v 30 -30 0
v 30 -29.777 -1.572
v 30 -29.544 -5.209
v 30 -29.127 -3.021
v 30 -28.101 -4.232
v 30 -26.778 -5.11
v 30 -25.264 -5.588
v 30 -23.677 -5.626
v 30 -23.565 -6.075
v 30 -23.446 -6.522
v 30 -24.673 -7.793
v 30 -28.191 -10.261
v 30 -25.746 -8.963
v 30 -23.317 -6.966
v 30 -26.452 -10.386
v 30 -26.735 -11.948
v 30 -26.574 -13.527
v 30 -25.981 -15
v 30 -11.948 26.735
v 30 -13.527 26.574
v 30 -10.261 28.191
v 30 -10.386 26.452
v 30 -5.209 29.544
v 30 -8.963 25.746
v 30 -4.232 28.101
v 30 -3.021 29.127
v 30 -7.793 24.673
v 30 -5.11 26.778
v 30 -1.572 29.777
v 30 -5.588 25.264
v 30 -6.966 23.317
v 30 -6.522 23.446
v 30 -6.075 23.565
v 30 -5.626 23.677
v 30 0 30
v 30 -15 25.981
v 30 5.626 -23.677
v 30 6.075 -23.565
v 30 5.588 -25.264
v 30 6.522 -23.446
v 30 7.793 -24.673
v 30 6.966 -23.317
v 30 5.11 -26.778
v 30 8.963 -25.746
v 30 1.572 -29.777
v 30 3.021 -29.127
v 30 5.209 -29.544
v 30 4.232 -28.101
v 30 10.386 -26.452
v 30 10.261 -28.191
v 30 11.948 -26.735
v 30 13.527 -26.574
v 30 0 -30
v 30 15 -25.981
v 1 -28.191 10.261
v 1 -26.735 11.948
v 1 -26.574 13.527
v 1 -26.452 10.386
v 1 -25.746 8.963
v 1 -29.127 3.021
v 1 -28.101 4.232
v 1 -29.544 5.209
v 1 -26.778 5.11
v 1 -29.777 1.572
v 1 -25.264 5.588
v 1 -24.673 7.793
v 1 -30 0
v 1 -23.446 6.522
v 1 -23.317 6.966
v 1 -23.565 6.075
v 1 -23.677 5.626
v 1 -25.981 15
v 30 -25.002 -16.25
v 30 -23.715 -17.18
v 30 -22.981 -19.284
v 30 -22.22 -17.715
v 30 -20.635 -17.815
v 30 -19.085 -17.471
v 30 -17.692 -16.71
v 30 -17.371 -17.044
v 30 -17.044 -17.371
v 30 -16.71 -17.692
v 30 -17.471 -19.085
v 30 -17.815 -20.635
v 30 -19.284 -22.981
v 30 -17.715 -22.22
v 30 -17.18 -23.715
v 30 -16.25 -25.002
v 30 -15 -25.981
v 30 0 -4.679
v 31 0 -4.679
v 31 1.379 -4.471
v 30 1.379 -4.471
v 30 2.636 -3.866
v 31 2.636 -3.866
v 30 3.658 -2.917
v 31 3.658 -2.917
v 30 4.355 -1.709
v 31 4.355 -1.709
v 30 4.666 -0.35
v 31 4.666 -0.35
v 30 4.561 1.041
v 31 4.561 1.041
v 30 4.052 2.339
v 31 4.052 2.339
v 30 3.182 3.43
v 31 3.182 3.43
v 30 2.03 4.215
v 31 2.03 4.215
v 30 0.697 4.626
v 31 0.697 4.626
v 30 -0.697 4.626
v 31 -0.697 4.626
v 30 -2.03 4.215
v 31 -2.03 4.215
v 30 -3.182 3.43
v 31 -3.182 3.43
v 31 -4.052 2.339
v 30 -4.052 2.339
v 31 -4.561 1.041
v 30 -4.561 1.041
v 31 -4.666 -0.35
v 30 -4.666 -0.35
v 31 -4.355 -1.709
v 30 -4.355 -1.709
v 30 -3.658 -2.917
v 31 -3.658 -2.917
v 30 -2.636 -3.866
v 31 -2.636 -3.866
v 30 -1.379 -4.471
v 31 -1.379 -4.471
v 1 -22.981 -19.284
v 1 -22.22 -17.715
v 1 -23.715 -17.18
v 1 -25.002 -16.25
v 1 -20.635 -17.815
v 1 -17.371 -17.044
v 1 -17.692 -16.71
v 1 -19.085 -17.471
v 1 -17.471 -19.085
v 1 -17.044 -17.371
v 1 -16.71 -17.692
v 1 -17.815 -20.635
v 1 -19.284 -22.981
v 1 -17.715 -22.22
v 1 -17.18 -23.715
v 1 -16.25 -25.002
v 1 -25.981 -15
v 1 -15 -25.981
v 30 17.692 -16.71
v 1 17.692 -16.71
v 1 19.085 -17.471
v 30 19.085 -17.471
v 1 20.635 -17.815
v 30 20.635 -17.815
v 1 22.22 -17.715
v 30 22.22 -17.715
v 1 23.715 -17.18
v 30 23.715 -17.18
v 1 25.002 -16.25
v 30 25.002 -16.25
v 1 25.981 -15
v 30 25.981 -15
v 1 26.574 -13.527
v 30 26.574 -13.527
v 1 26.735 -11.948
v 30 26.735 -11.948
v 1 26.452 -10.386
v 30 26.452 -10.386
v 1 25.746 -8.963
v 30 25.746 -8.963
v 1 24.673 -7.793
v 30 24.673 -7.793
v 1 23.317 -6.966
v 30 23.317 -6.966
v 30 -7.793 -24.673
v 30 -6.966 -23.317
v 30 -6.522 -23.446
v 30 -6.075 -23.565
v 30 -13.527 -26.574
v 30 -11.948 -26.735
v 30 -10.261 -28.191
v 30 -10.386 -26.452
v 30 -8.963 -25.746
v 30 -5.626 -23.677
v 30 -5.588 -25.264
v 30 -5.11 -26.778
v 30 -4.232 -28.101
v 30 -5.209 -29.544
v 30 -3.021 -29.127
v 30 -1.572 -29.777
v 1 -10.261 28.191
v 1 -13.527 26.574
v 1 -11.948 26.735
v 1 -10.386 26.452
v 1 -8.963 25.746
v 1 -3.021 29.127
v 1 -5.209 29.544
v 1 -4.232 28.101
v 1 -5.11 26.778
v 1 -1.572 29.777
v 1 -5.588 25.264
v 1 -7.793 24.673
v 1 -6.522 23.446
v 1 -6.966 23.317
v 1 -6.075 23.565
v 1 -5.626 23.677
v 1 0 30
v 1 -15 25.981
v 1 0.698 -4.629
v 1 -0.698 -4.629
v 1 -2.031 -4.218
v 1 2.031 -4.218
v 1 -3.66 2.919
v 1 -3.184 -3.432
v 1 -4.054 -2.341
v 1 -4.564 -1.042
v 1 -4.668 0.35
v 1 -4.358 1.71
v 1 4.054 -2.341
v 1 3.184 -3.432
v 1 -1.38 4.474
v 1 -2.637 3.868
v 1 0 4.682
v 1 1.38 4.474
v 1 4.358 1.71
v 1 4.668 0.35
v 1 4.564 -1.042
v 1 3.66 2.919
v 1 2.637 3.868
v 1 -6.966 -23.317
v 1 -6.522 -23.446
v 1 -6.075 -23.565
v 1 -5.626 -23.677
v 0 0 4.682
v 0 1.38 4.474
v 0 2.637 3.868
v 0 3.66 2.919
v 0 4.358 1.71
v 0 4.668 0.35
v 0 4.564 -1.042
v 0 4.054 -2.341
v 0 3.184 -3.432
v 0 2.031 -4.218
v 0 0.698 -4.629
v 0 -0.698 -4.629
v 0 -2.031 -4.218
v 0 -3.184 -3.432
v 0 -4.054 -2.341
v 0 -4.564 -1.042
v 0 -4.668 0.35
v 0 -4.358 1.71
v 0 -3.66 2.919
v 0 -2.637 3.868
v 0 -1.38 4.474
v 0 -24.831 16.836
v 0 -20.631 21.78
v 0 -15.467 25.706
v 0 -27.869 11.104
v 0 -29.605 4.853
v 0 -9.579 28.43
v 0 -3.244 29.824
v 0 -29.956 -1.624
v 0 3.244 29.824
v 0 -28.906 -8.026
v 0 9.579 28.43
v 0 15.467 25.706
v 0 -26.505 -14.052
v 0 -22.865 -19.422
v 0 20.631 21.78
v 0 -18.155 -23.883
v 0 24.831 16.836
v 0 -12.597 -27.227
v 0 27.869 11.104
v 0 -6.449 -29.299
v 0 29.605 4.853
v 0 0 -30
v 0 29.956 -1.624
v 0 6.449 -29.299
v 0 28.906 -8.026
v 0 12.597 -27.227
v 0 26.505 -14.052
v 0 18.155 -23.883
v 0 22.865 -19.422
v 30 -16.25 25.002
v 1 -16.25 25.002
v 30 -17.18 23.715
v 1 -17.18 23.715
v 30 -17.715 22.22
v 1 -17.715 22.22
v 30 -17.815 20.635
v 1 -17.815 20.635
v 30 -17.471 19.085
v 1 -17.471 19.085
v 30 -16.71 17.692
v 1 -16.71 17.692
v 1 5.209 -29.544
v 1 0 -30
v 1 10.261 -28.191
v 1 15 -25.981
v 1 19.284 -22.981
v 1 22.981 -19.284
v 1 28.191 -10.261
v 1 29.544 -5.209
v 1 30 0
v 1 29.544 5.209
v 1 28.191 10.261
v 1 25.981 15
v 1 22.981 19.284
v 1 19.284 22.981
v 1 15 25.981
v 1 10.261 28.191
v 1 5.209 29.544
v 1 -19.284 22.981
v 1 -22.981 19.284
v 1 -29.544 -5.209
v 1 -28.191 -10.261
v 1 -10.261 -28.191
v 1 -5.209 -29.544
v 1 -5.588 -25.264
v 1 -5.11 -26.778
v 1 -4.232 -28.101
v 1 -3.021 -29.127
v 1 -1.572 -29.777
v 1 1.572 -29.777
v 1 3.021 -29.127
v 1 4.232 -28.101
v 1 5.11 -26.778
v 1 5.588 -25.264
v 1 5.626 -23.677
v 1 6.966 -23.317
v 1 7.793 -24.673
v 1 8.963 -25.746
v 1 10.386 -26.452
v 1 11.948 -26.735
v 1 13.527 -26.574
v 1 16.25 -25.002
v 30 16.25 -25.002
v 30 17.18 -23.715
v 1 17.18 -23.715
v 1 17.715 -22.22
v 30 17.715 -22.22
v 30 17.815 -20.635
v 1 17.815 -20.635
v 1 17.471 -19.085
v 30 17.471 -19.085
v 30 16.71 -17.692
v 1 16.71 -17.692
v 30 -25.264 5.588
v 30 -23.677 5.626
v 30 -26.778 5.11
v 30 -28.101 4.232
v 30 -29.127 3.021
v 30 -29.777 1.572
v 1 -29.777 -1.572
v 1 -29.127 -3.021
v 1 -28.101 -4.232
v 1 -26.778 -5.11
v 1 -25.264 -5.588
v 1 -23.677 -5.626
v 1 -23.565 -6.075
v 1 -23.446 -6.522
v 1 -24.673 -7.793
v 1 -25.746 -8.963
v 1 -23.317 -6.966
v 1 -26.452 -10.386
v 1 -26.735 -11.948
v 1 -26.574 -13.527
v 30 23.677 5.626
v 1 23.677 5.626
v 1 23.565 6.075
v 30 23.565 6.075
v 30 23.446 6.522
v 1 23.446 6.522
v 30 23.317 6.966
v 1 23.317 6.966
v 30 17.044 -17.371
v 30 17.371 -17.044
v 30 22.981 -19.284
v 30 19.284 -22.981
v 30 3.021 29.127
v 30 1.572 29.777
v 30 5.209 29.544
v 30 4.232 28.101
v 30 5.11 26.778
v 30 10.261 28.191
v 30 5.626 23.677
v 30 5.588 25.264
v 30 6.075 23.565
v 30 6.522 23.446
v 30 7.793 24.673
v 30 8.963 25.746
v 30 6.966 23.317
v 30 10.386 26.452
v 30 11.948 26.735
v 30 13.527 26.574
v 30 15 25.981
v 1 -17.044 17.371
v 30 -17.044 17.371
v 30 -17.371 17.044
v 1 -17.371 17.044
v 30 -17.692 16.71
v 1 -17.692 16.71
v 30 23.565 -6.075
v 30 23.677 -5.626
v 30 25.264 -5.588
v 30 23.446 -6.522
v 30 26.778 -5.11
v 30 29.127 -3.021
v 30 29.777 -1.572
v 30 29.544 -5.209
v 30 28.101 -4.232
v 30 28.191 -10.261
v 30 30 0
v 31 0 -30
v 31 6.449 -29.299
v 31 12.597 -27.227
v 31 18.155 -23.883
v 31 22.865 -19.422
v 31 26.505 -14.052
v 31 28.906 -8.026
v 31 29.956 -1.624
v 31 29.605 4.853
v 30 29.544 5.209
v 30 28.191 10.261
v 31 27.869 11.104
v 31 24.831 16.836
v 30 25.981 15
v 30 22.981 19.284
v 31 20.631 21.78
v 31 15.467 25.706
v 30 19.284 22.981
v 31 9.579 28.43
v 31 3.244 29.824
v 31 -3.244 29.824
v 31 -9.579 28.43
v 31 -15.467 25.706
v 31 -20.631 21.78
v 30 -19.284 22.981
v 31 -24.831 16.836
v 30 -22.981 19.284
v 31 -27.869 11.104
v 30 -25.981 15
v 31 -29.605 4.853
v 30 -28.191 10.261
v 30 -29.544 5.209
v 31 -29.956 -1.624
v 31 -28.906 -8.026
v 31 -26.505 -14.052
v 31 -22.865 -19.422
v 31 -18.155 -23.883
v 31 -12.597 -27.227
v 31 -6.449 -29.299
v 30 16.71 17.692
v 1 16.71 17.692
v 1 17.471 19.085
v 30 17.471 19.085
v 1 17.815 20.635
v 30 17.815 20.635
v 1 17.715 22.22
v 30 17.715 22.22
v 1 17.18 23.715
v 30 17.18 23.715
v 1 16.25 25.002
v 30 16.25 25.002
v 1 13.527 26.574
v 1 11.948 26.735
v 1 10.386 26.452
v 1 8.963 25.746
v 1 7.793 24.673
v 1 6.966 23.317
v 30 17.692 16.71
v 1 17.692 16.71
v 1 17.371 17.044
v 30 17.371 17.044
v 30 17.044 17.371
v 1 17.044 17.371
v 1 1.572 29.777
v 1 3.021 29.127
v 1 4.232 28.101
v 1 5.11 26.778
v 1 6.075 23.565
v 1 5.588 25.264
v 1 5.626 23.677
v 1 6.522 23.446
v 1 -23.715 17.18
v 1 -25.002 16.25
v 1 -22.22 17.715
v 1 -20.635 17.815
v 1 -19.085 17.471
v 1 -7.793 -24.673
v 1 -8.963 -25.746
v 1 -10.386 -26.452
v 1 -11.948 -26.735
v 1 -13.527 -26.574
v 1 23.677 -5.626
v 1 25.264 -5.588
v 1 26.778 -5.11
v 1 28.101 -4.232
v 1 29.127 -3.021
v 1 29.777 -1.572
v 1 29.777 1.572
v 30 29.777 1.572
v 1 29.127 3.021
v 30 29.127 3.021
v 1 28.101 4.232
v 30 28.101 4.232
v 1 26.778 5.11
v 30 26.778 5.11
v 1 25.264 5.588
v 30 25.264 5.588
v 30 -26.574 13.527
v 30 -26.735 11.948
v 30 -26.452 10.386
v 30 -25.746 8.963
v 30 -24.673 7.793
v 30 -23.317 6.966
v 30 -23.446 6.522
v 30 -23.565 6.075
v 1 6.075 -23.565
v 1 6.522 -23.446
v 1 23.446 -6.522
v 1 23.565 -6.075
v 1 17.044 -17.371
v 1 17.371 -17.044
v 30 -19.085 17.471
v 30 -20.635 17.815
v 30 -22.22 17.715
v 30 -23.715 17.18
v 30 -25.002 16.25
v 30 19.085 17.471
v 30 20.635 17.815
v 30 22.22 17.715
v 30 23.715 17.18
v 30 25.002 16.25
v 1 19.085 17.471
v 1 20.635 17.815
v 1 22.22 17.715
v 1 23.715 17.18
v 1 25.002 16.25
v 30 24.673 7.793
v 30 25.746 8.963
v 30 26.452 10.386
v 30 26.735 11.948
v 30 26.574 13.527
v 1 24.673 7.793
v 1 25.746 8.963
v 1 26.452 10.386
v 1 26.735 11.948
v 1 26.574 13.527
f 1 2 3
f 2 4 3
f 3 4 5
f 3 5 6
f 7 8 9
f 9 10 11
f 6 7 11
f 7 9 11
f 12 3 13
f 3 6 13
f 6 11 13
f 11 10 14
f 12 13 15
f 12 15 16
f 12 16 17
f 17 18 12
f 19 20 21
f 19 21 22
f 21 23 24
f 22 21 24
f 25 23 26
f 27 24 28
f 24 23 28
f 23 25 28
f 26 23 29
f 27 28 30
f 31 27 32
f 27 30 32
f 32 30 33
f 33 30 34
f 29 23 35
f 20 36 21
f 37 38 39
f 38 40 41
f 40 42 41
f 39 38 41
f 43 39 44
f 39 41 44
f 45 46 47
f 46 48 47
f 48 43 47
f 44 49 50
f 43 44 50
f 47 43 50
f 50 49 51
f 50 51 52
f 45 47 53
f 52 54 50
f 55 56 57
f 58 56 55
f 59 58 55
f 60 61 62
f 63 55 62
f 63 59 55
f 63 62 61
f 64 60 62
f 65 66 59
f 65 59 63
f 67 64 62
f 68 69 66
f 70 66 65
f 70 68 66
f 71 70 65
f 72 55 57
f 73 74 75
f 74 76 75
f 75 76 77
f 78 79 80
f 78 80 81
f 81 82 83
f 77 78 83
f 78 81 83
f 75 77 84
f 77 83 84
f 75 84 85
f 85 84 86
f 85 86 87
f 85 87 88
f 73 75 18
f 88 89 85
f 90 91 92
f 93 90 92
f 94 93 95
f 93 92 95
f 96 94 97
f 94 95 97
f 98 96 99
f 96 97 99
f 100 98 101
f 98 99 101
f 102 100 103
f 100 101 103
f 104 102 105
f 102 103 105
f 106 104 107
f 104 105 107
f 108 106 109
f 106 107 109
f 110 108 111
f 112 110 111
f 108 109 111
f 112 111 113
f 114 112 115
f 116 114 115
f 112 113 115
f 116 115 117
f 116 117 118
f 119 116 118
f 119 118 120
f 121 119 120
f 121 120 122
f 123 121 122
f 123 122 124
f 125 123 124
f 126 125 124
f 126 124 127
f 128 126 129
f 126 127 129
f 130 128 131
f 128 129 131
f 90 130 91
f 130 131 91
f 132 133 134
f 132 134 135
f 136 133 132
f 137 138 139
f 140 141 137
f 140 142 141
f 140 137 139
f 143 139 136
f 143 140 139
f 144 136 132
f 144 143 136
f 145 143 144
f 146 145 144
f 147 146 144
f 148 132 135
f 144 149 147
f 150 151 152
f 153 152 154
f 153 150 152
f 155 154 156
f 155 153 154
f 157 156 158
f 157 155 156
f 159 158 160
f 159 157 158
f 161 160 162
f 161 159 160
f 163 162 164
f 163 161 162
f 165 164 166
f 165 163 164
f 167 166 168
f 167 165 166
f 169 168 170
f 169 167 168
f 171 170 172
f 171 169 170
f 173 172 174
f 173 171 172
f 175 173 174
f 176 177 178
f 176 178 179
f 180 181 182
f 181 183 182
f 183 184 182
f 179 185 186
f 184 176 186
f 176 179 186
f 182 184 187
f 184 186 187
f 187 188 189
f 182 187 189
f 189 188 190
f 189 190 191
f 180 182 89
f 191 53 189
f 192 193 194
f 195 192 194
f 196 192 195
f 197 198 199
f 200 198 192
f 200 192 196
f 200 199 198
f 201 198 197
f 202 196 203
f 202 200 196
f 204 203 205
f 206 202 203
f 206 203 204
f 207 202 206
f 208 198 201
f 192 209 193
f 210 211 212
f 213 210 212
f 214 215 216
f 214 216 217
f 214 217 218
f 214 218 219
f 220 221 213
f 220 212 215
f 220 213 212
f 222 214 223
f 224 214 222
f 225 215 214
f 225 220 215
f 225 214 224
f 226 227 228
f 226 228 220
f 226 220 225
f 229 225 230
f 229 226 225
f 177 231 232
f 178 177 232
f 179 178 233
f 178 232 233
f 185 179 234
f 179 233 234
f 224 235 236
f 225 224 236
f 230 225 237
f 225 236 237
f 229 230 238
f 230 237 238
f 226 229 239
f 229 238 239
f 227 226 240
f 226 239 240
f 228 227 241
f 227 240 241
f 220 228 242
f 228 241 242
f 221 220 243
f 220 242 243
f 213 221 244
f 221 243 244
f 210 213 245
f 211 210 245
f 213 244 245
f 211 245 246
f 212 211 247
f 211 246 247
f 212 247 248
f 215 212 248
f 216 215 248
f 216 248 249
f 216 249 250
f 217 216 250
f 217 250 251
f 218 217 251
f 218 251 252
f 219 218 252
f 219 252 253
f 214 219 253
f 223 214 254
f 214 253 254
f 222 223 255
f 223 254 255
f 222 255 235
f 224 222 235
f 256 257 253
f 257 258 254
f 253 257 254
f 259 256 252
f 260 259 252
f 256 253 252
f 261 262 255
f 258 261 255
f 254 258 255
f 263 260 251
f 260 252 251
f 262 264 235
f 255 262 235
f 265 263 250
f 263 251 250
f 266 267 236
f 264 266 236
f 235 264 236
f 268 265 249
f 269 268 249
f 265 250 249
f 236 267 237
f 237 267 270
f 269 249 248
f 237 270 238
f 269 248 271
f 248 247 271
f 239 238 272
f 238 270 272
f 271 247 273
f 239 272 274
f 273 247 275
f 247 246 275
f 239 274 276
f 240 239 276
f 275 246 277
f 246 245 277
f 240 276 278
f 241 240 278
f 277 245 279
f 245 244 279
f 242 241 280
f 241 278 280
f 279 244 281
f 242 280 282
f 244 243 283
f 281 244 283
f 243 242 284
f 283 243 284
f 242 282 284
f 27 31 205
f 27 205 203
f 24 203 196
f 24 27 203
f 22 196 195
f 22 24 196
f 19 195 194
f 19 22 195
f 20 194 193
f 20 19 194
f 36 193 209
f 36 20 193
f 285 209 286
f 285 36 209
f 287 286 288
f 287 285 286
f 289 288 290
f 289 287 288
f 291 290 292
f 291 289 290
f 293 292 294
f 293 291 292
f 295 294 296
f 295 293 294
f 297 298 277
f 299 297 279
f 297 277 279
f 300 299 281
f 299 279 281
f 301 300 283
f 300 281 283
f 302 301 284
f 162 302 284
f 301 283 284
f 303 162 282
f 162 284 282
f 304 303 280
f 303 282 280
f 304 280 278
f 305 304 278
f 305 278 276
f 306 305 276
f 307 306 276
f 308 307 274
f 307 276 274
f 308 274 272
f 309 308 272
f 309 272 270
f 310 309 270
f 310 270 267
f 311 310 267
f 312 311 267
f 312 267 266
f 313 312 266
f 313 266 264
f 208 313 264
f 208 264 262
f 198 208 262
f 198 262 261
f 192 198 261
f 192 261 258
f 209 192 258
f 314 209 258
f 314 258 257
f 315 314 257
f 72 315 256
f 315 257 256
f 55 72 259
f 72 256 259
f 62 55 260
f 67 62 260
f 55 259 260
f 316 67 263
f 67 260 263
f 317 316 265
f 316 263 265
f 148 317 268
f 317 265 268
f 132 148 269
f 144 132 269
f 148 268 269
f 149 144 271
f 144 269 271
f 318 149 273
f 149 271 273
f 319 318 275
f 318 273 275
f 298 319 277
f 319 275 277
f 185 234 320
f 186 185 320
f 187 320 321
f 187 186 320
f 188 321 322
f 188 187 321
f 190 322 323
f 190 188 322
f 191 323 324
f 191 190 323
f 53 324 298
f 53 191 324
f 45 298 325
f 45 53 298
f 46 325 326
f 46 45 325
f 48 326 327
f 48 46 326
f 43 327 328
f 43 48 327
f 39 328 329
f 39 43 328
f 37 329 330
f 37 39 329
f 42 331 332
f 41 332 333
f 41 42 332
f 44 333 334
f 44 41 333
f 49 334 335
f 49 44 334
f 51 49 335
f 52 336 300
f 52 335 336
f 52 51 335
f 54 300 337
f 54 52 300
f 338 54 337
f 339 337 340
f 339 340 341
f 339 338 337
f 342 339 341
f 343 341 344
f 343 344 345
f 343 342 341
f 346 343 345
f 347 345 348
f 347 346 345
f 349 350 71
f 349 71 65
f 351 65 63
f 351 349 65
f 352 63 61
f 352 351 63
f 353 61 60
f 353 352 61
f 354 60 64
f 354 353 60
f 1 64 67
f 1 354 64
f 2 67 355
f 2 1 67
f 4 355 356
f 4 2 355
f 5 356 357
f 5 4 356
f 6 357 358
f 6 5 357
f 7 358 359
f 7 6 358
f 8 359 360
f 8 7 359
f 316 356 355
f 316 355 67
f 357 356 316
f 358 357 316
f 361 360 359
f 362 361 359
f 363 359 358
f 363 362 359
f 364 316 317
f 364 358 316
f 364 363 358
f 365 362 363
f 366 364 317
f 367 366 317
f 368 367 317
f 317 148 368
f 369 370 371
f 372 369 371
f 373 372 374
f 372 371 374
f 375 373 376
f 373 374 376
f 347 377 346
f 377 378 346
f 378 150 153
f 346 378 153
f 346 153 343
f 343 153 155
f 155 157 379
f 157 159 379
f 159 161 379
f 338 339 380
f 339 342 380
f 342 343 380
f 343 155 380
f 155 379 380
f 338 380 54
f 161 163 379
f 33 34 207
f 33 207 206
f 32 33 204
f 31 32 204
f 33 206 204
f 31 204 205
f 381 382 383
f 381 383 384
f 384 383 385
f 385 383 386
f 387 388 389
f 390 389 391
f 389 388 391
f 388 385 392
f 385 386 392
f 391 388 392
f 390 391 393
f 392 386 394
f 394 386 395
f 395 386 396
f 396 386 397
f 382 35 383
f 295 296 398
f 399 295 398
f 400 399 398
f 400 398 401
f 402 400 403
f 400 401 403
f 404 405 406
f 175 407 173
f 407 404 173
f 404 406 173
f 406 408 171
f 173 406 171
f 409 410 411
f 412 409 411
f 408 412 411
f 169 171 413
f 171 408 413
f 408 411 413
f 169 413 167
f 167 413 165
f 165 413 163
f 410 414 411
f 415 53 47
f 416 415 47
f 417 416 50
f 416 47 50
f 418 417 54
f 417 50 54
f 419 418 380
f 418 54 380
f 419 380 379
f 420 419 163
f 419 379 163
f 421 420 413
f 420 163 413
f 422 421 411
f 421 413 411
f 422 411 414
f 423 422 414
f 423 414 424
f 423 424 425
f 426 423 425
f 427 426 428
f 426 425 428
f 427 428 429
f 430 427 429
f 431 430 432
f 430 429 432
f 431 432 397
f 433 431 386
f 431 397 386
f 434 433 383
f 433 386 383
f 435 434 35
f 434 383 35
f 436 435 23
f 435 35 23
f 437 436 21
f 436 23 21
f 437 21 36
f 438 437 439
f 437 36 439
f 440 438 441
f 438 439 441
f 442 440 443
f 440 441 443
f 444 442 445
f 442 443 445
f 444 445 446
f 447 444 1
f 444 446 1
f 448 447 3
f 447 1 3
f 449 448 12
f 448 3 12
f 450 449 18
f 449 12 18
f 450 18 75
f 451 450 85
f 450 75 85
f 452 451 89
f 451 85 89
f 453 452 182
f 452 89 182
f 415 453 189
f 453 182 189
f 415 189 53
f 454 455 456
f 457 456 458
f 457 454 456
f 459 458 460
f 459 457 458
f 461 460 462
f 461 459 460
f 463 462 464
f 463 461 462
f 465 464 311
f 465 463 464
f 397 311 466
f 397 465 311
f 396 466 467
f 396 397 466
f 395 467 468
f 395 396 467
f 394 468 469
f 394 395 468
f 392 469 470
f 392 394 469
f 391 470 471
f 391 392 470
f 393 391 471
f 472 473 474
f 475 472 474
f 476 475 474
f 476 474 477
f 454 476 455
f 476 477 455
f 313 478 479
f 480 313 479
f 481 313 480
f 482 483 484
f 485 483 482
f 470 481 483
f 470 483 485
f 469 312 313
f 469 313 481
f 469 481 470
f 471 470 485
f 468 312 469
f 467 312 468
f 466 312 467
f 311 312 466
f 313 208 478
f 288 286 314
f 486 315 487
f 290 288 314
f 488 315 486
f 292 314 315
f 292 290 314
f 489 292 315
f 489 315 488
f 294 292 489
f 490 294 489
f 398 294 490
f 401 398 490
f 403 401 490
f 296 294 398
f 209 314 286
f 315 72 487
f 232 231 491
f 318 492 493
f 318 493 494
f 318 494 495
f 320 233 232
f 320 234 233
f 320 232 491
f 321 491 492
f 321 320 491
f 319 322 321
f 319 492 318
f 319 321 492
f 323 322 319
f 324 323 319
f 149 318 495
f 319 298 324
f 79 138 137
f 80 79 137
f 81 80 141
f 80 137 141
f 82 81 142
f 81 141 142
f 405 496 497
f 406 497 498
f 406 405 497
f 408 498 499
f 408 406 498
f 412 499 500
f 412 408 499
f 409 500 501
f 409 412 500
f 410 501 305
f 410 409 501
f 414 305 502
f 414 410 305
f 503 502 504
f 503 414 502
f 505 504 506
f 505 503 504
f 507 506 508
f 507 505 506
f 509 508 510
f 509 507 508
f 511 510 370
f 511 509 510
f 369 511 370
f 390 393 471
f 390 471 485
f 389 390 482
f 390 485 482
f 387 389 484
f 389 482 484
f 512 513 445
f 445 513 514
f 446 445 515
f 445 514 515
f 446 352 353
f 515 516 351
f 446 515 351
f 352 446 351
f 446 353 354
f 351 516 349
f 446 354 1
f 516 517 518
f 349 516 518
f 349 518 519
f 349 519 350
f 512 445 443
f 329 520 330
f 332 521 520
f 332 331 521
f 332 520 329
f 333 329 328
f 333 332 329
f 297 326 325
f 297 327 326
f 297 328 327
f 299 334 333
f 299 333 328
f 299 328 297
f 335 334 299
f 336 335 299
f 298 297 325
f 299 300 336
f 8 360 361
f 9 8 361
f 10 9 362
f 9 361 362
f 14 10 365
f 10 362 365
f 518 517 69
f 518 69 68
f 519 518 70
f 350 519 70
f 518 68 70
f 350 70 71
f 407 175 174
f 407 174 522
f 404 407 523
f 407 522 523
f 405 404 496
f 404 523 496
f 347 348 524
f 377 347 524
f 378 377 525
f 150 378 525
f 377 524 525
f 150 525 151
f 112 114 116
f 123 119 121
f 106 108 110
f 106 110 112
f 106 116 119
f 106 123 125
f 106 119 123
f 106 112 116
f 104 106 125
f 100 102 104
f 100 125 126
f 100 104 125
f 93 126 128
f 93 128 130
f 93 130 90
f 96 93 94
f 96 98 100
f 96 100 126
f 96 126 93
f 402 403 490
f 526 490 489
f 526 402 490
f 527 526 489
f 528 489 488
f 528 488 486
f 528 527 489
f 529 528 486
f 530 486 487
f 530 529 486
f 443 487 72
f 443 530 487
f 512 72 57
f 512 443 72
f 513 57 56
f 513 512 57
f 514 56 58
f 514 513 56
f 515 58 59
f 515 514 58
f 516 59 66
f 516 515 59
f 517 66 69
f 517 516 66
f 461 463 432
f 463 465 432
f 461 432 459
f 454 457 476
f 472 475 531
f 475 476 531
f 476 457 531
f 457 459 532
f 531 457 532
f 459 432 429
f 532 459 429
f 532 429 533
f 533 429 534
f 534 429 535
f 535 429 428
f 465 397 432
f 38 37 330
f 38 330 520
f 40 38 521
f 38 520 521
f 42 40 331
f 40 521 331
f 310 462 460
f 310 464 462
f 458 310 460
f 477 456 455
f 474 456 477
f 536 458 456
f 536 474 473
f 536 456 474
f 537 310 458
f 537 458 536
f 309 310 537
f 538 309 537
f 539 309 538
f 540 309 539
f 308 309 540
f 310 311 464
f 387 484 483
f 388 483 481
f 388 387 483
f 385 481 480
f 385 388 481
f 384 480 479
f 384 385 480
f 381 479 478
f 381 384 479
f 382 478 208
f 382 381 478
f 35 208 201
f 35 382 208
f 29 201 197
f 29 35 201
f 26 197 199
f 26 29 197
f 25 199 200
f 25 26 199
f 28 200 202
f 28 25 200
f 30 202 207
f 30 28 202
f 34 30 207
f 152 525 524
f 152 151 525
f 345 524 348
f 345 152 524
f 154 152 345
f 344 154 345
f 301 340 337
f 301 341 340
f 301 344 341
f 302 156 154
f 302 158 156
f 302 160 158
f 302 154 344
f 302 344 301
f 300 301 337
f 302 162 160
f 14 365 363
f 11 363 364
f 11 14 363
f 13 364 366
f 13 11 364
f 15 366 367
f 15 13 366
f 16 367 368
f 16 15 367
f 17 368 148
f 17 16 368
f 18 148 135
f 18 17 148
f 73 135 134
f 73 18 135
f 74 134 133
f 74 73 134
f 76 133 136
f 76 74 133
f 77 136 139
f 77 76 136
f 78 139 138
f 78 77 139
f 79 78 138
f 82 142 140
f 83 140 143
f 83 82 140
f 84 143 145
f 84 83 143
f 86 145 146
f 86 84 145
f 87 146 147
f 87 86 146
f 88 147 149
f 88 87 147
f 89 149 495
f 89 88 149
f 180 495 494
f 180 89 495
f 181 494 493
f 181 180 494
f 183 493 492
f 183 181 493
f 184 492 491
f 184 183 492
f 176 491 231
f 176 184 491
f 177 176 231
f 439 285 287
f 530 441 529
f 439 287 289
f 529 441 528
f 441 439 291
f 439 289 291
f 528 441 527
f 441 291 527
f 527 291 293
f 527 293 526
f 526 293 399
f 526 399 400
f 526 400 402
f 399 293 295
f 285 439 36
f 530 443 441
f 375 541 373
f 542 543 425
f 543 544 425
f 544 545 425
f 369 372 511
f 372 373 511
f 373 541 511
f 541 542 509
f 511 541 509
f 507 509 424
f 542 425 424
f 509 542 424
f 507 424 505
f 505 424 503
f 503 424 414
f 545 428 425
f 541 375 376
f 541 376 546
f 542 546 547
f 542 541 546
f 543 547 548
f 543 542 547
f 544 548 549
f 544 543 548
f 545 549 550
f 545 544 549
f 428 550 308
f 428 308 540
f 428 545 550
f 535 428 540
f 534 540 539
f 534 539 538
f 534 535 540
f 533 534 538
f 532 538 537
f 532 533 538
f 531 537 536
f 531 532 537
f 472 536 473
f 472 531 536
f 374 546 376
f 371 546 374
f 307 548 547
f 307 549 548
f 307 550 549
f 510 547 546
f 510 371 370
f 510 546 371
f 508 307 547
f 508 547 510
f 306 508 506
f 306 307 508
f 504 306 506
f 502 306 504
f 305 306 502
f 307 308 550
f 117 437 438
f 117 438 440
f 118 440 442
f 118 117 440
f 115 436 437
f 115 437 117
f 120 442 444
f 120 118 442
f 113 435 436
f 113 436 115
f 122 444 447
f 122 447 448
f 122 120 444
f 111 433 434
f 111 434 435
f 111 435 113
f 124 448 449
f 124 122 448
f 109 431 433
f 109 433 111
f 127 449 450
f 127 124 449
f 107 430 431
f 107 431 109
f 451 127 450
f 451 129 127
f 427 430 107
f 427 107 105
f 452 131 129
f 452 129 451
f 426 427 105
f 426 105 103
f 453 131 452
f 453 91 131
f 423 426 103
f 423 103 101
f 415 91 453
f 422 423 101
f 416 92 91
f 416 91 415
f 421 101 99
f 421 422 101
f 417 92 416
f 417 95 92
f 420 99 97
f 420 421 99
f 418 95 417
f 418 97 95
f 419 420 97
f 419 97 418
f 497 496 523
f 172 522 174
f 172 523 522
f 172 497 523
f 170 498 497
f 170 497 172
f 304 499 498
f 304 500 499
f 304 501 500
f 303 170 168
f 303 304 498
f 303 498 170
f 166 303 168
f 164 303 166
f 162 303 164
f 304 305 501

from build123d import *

# Parameters (mm, degrees)
SKETCH1_R           = 30
BOSS_EXTRUDE1_DEPTH = 1
SKETCH2_R           = 24.335851471
BOSS_EXTRUDE2_DEPTH = 29
SKETCH3_R           = 5.664148529
BOSS_EXTRUDE3_DEPTH = 29
SKETCH4_R           = 30
BOSS_EXTRUDE4_DEPTH = 1
SKETCH5_R           = 4.681501742
CUT_EXTRUDE1_DEPTH  = 1
SKETCH6_R           = 4.678679428
CUT_EXTRUDE2_DEPTH  = 1


with BuildPart() as part:
    # Sketch1 → Boss-Extrude1 (new body)
    with BuildSketch(Plane(origin=(0, 0, 0), x_dir=(0, 0, -1), z_dir=(1, 0, 0))):
        Circle(SKETCH1_R)
    extrude(amount=BOSS_EXTRUDE1_DEPTH)

    # Sketch2 → Boss-Extrude2 (add)
    with BuildSketch(Plane(origin=(1, 0, 0), x_dir=(0, 0, -1), z_dir=(1, 0, 0))):
        Circle(SKETCH2_R)
    extrude(amount=BOSS_EXTRUDE2_DEPTH)

    # Sketch3 → Boss-Extrude3 (add)
    with BuildSketch(Plane(origin=(30, 0, 0), x_dir=(0, 0, -1), z_dir=(1, 0, 0))):
        with Locations((0, 24.335851471)):
            Circle(SKETCH3_R)
        with Locations((12.167925735, 21.075465597)):
            Circle(SKETCH3_R)
        with Locations((21.075465597, 12.167925735)):
            Circle(SKETCH3_R)
        with Locations((24.335851471, 0)):
            Circle(SKETCH3_R)
        with Locations((21.075465597, -12.167925735)):
            Circle(SKETCH3_R)
        with Locations((12.167925735, -21.075465597)):
            Circle(SKETCH3_R)
        with Locations((0, -24.335851471)):
            Circle(SKETCH3_R)
        with Locations((-12.167925735, -21.075465597)):
            Circle(SKETCH3_R)
        with Locations((-21.075465597, -12.167925735)):
            Circle(SKETCH3_R)
        with Locations((-24.335851471, 0)):
            Circle(SKETCH3_R)
        with Locations((-21.075465597, 12.167925735)):
            Circle(SKETCH3_R)
        with Locations((-12.167925735, 21.075465597)):
            Circle(SKETCH3_R)
    extrude(amount=-BOSS_EXTRUDE3_DEPTH)

    # Sketch4 → Boss-Extrude4 (add)
    with BuildSketch(Plane(origin=(30, 0, 0), x_dir=(0, 0, -1), z_dir=(1, 0, 0))):
        Circle(SKETCH4_R)
    extrude(amount=BOSS_EXTRUDE4_DEPTH)

    # Sketch5 → Cut-Extrude1 (cut)
    with BuildSketch(Plane.ZY):
        Circle(SKETCH5_R)
    extrude(amount=-CUT_EXTRUDE1_DEPTH, mode=Mode.SUBTRACT)

    # Sketch6 → Cut-Extrude2 (cut)
    with BuildSketch(Plane(origin=(31, 0, 0), x_dir=(0, 0, -1), z_dir=(1, 0, 0))):
        Circle(SKETCH6_R)
    extrude(amount=-CUT_EXTRUDE2_DEPTH, mode=Mode.SUBTRACT)


solid = part.part
